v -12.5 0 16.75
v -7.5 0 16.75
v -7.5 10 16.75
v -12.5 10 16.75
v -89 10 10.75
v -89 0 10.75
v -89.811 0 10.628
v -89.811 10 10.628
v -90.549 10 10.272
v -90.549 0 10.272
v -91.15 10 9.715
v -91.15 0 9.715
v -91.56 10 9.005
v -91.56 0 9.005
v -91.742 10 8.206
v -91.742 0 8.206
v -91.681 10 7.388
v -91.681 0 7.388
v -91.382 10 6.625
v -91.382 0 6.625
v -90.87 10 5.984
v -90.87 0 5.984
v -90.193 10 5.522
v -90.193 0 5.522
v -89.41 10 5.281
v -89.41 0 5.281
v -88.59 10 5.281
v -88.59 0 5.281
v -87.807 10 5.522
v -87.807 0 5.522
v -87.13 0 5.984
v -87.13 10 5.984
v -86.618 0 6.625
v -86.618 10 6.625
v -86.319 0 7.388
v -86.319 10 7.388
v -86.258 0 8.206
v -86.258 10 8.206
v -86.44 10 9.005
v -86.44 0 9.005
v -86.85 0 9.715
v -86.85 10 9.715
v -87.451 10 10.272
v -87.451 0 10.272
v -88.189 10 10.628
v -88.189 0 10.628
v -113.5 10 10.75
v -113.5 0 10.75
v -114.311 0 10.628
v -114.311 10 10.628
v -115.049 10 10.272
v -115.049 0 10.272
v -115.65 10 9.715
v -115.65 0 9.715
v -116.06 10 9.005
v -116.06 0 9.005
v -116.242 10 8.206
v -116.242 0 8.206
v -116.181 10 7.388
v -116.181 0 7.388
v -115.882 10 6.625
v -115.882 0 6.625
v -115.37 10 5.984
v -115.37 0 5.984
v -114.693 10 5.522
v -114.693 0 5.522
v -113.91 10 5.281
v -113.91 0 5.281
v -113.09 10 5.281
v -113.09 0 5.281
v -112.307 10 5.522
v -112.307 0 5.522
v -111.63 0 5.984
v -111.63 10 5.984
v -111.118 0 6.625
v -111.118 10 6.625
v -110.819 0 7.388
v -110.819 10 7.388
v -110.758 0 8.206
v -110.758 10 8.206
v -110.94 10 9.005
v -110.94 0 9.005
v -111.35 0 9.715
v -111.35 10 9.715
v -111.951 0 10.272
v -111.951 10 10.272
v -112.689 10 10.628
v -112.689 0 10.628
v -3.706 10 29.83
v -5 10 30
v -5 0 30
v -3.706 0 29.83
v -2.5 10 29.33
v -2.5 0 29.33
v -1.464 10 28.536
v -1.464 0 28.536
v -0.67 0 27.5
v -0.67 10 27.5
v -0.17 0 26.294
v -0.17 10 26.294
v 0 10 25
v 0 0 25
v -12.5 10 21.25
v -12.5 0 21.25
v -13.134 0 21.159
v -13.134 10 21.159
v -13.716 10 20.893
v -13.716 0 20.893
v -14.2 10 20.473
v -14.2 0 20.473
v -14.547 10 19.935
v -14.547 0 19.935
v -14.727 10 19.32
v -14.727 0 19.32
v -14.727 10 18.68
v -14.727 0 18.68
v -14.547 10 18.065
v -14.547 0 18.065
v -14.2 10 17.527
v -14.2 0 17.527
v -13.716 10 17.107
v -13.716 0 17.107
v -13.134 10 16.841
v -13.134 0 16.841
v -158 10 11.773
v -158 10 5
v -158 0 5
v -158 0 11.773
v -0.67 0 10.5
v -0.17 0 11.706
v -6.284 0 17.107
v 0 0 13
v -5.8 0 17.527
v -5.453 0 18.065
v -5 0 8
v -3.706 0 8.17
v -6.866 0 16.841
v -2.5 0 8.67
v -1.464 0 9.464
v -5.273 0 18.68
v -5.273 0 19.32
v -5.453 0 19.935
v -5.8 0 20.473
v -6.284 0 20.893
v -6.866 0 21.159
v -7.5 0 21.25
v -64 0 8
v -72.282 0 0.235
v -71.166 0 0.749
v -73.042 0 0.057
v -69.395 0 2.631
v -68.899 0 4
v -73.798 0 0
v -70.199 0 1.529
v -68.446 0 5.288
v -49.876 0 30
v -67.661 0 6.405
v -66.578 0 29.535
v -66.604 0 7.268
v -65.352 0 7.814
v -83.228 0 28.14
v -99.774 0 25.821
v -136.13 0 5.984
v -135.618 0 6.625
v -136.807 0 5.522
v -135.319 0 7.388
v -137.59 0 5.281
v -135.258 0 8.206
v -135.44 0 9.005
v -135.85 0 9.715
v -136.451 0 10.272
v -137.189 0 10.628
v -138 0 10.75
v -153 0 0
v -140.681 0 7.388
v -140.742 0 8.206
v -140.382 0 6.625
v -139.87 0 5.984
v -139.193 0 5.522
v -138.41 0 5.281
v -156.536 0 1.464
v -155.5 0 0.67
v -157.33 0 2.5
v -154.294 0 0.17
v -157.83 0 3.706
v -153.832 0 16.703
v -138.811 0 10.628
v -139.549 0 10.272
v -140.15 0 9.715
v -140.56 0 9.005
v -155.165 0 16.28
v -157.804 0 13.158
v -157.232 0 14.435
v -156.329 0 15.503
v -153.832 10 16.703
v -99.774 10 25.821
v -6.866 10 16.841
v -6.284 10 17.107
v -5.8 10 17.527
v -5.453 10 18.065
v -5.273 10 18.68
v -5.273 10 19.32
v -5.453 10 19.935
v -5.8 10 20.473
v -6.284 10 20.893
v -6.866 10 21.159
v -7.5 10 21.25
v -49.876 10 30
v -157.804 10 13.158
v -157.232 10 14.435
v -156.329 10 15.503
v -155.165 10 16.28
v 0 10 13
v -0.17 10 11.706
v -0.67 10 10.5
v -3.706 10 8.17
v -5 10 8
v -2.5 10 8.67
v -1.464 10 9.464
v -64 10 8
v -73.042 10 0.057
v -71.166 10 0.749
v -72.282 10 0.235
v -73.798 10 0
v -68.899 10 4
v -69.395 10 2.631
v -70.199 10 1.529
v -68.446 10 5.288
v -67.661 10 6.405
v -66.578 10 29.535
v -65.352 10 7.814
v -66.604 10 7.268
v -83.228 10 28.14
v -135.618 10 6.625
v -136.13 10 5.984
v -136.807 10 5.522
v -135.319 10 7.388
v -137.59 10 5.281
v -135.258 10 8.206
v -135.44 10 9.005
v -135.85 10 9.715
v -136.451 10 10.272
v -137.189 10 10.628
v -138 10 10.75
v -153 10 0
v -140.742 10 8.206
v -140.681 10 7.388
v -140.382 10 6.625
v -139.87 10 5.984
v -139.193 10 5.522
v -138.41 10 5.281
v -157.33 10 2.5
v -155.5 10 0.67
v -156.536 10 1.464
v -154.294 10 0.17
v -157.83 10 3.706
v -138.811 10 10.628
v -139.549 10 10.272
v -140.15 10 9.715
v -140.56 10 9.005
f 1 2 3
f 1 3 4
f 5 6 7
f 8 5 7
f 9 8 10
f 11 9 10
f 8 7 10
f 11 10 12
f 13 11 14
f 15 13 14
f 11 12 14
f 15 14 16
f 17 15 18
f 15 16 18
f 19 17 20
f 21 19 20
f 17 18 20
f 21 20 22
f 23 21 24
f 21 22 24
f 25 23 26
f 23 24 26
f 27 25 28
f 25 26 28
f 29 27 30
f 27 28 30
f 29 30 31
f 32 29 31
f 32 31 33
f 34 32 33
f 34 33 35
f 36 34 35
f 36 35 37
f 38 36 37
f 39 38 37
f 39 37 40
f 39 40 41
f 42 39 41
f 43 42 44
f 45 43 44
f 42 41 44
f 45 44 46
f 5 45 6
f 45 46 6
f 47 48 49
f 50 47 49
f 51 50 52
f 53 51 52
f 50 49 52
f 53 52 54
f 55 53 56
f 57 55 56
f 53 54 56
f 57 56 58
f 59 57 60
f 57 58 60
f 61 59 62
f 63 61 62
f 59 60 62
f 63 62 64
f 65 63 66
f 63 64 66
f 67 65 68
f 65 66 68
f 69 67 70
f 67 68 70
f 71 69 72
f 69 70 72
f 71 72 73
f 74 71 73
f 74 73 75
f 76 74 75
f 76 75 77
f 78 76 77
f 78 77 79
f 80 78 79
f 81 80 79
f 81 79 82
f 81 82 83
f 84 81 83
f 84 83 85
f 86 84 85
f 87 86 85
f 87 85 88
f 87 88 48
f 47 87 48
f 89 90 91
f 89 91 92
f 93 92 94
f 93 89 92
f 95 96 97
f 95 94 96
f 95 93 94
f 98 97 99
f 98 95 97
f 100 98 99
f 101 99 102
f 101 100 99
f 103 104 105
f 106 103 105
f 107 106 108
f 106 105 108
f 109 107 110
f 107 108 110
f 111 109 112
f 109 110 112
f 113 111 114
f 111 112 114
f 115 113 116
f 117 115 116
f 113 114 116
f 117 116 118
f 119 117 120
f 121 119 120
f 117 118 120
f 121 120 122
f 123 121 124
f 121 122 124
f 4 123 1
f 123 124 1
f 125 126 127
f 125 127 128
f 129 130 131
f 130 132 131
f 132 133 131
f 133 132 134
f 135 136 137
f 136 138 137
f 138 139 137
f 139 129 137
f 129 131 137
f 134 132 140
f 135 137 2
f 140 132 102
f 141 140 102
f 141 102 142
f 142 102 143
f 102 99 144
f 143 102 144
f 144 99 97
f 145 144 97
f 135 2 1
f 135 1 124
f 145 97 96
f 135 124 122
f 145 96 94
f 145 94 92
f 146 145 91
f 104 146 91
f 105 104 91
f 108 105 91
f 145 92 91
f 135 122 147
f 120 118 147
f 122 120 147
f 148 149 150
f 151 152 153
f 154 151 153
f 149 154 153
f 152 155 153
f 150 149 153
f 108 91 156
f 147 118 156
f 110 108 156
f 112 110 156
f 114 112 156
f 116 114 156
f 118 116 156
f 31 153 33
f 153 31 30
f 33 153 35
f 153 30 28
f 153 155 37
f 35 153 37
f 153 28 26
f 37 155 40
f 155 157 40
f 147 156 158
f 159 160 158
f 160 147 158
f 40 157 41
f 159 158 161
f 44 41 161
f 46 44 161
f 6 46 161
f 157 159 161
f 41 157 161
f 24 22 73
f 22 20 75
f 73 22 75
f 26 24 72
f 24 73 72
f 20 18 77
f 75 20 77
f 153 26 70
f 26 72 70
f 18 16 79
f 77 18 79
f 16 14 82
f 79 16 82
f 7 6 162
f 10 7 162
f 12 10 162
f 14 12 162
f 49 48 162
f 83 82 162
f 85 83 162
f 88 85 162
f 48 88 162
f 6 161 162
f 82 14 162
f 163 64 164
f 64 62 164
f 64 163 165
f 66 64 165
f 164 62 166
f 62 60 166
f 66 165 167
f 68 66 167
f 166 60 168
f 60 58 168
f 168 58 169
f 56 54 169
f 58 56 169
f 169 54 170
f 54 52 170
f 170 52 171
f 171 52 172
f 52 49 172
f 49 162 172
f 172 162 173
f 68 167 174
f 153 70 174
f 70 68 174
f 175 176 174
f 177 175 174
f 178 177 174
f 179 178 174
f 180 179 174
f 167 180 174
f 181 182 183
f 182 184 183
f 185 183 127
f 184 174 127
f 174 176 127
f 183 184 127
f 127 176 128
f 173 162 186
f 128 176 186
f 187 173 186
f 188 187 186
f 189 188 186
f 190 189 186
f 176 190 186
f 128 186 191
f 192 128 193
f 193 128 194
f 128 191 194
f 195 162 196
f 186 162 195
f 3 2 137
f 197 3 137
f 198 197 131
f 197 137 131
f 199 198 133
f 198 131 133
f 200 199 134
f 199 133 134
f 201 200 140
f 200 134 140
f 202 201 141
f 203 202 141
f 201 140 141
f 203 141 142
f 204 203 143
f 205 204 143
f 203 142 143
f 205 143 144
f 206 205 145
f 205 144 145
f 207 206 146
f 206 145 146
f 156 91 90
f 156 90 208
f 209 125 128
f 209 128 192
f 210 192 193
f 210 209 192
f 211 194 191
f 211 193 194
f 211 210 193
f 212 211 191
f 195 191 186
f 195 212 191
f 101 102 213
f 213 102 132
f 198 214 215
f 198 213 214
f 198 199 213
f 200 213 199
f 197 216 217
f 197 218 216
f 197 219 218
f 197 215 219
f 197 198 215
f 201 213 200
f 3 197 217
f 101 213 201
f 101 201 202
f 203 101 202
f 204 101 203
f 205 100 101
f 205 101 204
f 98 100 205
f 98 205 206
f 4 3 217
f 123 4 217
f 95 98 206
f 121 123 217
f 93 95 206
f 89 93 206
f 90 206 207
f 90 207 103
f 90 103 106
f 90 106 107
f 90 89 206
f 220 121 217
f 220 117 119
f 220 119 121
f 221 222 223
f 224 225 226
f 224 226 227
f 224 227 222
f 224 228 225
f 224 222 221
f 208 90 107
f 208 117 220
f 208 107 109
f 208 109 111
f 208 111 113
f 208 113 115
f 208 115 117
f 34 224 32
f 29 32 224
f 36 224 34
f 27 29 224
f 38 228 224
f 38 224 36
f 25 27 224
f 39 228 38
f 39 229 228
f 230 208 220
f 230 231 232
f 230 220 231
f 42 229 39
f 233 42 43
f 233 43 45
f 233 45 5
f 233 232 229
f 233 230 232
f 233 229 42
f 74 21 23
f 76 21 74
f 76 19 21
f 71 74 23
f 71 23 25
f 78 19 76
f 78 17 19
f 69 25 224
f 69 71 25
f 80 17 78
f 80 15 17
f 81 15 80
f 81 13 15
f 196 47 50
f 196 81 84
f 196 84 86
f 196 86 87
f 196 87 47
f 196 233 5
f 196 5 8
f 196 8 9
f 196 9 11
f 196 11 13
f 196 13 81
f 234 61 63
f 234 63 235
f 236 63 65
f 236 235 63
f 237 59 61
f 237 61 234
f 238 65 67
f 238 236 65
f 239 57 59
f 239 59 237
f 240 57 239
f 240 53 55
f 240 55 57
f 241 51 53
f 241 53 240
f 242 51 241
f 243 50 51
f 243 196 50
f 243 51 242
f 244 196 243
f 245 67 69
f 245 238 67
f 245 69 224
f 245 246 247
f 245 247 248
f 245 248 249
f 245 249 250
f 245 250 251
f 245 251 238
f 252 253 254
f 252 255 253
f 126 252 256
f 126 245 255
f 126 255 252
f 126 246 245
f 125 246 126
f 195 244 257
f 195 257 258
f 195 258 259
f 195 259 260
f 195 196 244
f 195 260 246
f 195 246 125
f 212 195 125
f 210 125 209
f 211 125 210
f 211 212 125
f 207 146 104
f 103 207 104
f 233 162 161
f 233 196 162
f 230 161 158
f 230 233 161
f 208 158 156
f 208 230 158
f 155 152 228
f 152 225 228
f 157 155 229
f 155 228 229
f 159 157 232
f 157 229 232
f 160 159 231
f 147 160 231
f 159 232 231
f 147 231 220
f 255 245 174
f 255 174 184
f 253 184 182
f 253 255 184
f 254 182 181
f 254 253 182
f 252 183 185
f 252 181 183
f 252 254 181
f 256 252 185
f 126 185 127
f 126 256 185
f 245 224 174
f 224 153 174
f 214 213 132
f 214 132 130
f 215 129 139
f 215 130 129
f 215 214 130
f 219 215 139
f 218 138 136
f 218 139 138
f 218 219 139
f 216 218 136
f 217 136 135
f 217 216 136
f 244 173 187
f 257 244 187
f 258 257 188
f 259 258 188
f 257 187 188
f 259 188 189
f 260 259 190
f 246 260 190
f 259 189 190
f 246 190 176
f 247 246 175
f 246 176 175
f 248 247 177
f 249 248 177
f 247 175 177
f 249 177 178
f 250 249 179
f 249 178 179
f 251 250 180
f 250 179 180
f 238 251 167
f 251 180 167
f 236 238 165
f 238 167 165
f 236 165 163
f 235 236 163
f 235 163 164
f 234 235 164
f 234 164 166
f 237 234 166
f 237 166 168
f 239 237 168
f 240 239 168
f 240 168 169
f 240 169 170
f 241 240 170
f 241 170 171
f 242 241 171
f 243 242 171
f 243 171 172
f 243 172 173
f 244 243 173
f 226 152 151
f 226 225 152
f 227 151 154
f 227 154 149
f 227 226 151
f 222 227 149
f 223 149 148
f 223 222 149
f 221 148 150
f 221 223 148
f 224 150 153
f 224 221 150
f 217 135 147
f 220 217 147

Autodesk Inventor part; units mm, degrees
ref_plane "YZ Plane" through (0, 0, 0) normal (1, 0, 0) x (0, 1, 0)
ref_plane "XZ Plane" through (0, 0, 0) normal (0, 1, 0) x (-1, 0, 0)
ref_plane "XY Plane" through (0, 0, 0) normal (0, 0, 1) x (1, 0, 0)
sketch "Skizze6" plane through (0, 0, 0) normal (0, 1, 0) x (-1, 0, 0)
  line L0 (69, 0) -> (158, 0)
  line L1 (158, 0) -> (158, 16)
  line L2 (0, 30) -> (0, 8)
  line L3 (0, 8) -> (69, 8)
  line L4 (69, 8) -> (69, 0)
  line L5 (0, 30) -> (75, 30)
  line L6 (75, 30) -> (158, 16)
  point P0 (0, 0)
  dimension "d34" = 89
  dimension "d35" = 22
  dimension "d36" = 30
  dimension "d37" = 158
  dimension "d38" = 75
  dimension "d41" = 16
extrude "Extrusion2" add sketch "Skizze6" along normal blind 10
sketch "Skizze7" plane through (0, 10, 0) normal (0, 1, 0) x (1, 0, 0)
  line L0 (-69, 0) -> (-158, 0) projected
  line L1 (-158, 0) -> (-158, -16) projected
  point P0 (0, 0)
  point P1 (-138, -8)
  point P2 (-113.5, -8)
  point P3 (-89, -8)
  point P4 (-138.2626, -14.3361)
  dimension "d42" = 8
  dimension "d43" = 20
  dimension "d44" = 24.5
  dimension "d45" = 24.5
hole "Bohrung5" at (-113.5, 10, 8) at (-89, 10, 8) at (-138, 10, 8) direction (0, -1, 0) diameter 5.5 end through all
sketch "Skizze8" plane through (0, 0, 0) normal (0, -1, 0) x (1, 0, 0)
  arc A0 (-12.5, 21.25) -> (-12.5, 16.75) centre (-12.5, 19) ccw
  line L0 (-75, 30) -> (0, 30) projected
  arc A1 (-7.5, 16.75) -> (-7.5, 21.25) centre (-7.5, 19) ccw
  line L1 (-7.5, 16.75) -> (-12.5, 16.75)
  line L2 (-7.5, 21.25) -> (-12.5, 21.25)
  line L3 (0, 30) -> (0, 8) projected
  line L4 (-158, 0) -> (-158, 16) projected
  point P0 (0, 0)
  dimension "d53" = 4.5
  dimension "d54" = 11
  dimension "d55" = 4.5
  dimension "d56" = 5
  dimension "d58" = 145.5
extrude "Extrusion3" cut sketch "Skizze8" against normal through all
fillet "Rundung1" radius 5 6 edges at (-69, 5, 8) (-69, 5, 0) (0, 5, 8) (0, 5, 30) (-158, 5, 16) (-158, 5, 0)
fillet "Rundung2" radius 300 1 edges at (-75, 5, 30)
properties part number "106.016.01_Anbindung_Vereinzelung"
